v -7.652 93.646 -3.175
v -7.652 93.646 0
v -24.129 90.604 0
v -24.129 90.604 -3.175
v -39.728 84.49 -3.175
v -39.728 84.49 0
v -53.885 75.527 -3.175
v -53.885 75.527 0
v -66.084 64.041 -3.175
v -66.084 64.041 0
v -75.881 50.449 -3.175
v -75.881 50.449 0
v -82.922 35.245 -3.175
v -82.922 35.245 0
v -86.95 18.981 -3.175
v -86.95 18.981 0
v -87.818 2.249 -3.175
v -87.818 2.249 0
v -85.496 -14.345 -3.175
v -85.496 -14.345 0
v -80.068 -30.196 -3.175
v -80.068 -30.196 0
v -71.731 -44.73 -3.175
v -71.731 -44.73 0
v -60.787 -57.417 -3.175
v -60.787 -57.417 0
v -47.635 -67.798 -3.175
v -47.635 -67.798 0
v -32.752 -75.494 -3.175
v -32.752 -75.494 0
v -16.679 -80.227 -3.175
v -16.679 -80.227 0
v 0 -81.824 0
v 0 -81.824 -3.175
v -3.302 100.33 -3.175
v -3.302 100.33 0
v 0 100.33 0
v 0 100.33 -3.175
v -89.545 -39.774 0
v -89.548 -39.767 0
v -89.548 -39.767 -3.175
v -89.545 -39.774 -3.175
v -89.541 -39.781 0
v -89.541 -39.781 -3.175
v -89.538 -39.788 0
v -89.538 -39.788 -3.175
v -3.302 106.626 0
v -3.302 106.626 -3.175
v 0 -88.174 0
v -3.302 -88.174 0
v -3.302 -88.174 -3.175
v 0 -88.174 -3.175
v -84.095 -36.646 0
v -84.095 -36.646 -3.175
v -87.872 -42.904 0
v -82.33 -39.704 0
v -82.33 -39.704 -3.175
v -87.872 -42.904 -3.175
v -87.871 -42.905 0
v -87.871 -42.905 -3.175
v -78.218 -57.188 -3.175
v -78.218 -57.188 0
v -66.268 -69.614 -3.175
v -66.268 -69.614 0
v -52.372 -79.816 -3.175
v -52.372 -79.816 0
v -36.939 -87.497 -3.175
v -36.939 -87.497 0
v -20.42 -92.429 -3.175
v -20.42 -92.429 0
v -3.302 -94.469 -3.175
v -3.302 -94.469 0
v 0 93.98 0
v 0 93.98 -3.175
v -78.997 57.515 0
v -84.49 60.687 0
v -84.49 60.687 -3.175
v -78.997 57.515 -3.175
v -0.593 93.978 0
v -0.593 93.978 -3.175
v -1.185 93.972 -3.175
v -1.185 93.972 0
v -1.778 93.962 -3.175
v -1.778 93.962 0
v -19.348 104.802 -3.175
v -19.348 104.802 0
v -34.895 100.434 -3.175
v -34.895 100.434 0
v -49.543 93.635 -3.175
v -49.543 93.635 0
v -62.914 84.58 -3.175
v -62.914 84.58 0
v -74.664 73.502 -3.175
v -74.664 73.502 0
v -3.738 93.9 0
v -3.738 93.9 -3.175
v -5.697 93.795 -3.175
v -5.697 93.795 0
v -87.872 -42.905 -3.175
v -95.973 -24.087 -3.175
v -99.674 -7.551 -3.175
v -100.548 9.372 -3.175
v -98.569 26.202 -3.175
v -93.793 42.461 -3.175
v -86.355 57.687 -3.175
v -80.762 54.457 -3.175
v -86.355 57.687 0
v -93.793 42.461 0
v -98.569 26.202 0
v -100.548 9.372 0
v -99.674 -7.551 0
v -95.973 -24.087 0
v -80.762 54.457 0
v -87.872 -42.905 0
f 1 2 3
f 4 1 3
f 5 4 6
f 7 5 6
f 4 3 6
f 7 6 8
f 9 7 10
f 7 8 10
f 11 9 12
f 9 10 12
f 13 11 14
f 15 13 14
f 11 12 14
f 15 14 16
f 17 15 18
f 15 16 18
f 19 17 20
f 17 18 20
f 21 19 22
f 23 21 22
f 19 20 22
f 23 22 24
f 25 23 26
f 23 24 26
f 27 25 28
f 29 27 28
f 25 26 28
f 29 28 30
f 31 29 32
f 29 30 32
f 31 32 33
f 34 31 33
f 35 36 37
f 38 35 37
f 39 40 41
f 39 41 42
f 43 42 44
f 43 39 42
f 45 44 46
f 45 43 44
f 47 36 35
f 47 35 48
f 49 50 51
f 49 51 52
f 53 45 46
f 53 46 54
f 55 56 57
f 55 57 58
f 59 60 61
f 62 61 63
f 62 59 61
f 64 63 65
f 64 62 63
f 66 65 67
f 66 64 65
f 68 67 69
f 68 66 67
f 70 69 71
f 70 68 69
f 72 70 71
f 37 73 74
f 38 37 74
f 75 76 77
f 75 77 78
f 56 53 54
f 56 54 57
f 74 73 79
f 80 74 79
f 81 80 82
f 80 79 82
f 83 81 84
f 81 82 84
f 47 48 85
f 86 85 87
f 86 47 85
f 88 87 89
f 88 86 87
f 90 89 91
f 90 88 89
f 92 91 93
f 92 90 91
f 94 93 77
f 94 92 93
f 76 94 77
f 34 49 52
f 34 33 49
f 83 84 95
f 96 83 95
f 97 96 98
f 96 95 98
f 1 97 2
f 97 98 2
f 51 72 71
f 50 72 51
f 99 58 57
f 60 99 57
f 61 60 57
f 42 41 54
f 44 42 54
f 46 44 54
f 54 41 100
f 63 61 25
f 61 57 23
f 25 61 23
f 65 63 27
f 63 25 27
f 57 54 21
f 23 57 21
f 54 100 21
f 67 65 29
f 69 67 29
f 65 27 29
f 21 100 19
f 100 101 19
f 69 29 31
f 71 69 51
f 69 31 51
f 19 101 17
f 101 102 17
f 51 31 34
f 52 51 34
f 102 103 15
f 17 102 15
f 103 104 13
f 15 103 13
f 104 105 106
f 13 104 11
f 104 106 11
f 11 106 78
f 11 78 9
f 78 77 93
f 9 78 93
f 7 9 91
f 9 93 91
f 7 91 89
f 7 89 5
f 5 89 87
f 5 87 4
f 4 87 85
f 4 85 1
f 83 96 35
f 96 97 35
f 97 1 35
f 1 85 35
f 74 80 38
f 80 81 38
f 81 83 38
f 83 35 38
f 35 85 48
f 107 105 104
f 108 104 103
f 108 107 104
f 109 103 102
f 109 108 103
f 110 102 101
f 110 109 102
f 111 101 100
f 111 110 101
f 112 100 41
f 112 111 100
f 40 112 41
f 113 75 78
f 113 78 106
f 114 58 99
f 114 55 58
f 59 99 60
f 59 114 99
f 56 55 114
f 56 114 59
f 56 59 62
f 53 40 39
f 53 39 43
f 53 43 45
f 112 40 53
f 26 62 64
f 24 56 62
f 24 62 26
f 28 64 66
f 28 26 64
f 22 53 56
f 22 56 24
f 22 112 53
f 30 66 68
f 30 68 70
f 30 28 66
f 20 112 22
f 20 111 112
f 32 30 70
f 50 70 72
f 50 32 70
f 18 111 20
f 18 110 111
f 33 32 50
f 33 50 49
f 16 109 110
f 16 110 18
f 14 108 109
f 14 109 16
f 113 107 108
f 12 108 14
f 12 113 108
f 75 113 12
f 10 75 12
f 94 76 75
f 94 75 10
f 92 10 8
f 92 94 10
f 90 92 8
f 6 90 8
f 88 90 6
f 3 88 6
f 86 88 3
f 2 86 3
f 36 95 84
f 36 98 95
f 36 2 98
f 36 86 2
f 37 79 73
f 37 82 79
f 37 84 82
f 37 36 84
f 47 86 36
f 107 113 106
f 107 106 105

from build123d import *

# Parameters (mm, degrees)
BOSS_EXTRUDE1_DEPTH = 3.175
SKETCH3_W           = 149.303507008
SKETCH3_H           = 288.678903575
CUT_EXTRUDE1_DEPTH  = 101.601825752
SKETCH4_W           = 3.302
SKETCH4_H           = 7.449124121
SKETCH4_H_2         = 9.965839279
CUT_EXTRUDE2_DEPTH  = 4.175


with BuildPart() as part:
    # Sketch2 → Boss-Extrude1 (new body)
    with BuildSketch(Plane.XY):
        with BuildLine():
            ThreePointArc((-1.783927604, 106.664181958), (-86.289926541, 57.796410124), (-89.548347912, -39.767444199))
            ThreePointArc((-89.548347912, -39.767444199), (-89.139366423, -40.557656379), (-88.723411943, -41.344220438))
            ThreePointArc((-88.723411943, -41.344220438), (-88.300763494, -42.126623343), (-87.87121564, -42.905259753))
            ThreePointArc((-87.87121564, -42.905259753), (0, -94.523651503), (87.87121564, -42.905259753))
            ThreePointArc((87.87121564, -42.905259753), (88.300763494, -42.126623343), (88.723411943, -41.344220438))
            ThreePointArc((88.723411943, -41.344220438), (89.139366423, -40.557656379), (89.548347912, -39.767444199))
            ThreePointArc((89.548347912, -39.767444199), (86.289926541, 57.796410124), (1.783927604, 106.664181958))
            ThreePointArc((1.783927604, 106.664181958), (0.891998866, 106.676045412), (0, 106.68))
            ThreePointArc((0, 106.68), (-0.891998866, 106.676045412), (-1.783927604, 106.664181958))
        make_face()
        with BuildLine():
            ThreePointArc((-7.652045127, 93.646303016), (0, -81.823651503), (7.652045127, 93.646303016))
            ThreePointArc((7.652045127, 93.646303016), (4.717664566, 93.853310885), (1.778000524, 93.962016248))
            ThreePointArc((1.778000524, 93.962016248), (0.889045735, 93.975503947), (0, 93.98))
            ThreePointArc((0, 93.98), (-0.889045735, 93.975503947), (-1.778000524, 93.962016248))
            ThreePointArc((-1.778000524, 93.962016248), (-4.717664566, 93.853310885), (-7.652045127, 93.646303016))
        make_face(mode=Mode.SUBTRACT)
    extrude(amount=-BOSS_EXTRUDE1_DEPTH)

    # Sketch3 → Cut-Extrude1 (cut, through all)
    with BuildSketch(Plane(origin=(0, 0, 0), x_dir=(0, 0, -1), z_dir=(1, 0, 0))):
        with Locations((2.160275602, 8.369276658)):
            Rectangle(SKETCH3_W, SKETCH3_H)
    extrude(amount=CUT_EXTRUDE1_DEPTH, mode=Mode.SUBTRACT)

    # Sketch4 → Cut-Extrude2 (cut, through all)
    with BuildSketch(Plane.XY):
        Polygon((-88.109110822, 62.776111712), (-78.996562371, 57.51497941), (-80.761862371, 54.45739012), (-89.874410822, 59.718522421), align=None)
        Polygon((-84.09504483, -36.64600391), (-82.32974483, -39.7035932), (-90.457535691, -44.396175442), (-92.222835691, -41.338586151), align=None)
        with Locations((-1.651, -91.898213564)):
            Rectangle(SKETCH4_W, SKETCH4_H)
        with Locations((-1.651, 105.31291964)):
            Rectangle(SKETCH4_W, SKETCH4_H_2)
    extrude(amount=-CUT_EXTRUDE2_DEPTH, mode=Mode.SUBTRACT)


solid = part.part
